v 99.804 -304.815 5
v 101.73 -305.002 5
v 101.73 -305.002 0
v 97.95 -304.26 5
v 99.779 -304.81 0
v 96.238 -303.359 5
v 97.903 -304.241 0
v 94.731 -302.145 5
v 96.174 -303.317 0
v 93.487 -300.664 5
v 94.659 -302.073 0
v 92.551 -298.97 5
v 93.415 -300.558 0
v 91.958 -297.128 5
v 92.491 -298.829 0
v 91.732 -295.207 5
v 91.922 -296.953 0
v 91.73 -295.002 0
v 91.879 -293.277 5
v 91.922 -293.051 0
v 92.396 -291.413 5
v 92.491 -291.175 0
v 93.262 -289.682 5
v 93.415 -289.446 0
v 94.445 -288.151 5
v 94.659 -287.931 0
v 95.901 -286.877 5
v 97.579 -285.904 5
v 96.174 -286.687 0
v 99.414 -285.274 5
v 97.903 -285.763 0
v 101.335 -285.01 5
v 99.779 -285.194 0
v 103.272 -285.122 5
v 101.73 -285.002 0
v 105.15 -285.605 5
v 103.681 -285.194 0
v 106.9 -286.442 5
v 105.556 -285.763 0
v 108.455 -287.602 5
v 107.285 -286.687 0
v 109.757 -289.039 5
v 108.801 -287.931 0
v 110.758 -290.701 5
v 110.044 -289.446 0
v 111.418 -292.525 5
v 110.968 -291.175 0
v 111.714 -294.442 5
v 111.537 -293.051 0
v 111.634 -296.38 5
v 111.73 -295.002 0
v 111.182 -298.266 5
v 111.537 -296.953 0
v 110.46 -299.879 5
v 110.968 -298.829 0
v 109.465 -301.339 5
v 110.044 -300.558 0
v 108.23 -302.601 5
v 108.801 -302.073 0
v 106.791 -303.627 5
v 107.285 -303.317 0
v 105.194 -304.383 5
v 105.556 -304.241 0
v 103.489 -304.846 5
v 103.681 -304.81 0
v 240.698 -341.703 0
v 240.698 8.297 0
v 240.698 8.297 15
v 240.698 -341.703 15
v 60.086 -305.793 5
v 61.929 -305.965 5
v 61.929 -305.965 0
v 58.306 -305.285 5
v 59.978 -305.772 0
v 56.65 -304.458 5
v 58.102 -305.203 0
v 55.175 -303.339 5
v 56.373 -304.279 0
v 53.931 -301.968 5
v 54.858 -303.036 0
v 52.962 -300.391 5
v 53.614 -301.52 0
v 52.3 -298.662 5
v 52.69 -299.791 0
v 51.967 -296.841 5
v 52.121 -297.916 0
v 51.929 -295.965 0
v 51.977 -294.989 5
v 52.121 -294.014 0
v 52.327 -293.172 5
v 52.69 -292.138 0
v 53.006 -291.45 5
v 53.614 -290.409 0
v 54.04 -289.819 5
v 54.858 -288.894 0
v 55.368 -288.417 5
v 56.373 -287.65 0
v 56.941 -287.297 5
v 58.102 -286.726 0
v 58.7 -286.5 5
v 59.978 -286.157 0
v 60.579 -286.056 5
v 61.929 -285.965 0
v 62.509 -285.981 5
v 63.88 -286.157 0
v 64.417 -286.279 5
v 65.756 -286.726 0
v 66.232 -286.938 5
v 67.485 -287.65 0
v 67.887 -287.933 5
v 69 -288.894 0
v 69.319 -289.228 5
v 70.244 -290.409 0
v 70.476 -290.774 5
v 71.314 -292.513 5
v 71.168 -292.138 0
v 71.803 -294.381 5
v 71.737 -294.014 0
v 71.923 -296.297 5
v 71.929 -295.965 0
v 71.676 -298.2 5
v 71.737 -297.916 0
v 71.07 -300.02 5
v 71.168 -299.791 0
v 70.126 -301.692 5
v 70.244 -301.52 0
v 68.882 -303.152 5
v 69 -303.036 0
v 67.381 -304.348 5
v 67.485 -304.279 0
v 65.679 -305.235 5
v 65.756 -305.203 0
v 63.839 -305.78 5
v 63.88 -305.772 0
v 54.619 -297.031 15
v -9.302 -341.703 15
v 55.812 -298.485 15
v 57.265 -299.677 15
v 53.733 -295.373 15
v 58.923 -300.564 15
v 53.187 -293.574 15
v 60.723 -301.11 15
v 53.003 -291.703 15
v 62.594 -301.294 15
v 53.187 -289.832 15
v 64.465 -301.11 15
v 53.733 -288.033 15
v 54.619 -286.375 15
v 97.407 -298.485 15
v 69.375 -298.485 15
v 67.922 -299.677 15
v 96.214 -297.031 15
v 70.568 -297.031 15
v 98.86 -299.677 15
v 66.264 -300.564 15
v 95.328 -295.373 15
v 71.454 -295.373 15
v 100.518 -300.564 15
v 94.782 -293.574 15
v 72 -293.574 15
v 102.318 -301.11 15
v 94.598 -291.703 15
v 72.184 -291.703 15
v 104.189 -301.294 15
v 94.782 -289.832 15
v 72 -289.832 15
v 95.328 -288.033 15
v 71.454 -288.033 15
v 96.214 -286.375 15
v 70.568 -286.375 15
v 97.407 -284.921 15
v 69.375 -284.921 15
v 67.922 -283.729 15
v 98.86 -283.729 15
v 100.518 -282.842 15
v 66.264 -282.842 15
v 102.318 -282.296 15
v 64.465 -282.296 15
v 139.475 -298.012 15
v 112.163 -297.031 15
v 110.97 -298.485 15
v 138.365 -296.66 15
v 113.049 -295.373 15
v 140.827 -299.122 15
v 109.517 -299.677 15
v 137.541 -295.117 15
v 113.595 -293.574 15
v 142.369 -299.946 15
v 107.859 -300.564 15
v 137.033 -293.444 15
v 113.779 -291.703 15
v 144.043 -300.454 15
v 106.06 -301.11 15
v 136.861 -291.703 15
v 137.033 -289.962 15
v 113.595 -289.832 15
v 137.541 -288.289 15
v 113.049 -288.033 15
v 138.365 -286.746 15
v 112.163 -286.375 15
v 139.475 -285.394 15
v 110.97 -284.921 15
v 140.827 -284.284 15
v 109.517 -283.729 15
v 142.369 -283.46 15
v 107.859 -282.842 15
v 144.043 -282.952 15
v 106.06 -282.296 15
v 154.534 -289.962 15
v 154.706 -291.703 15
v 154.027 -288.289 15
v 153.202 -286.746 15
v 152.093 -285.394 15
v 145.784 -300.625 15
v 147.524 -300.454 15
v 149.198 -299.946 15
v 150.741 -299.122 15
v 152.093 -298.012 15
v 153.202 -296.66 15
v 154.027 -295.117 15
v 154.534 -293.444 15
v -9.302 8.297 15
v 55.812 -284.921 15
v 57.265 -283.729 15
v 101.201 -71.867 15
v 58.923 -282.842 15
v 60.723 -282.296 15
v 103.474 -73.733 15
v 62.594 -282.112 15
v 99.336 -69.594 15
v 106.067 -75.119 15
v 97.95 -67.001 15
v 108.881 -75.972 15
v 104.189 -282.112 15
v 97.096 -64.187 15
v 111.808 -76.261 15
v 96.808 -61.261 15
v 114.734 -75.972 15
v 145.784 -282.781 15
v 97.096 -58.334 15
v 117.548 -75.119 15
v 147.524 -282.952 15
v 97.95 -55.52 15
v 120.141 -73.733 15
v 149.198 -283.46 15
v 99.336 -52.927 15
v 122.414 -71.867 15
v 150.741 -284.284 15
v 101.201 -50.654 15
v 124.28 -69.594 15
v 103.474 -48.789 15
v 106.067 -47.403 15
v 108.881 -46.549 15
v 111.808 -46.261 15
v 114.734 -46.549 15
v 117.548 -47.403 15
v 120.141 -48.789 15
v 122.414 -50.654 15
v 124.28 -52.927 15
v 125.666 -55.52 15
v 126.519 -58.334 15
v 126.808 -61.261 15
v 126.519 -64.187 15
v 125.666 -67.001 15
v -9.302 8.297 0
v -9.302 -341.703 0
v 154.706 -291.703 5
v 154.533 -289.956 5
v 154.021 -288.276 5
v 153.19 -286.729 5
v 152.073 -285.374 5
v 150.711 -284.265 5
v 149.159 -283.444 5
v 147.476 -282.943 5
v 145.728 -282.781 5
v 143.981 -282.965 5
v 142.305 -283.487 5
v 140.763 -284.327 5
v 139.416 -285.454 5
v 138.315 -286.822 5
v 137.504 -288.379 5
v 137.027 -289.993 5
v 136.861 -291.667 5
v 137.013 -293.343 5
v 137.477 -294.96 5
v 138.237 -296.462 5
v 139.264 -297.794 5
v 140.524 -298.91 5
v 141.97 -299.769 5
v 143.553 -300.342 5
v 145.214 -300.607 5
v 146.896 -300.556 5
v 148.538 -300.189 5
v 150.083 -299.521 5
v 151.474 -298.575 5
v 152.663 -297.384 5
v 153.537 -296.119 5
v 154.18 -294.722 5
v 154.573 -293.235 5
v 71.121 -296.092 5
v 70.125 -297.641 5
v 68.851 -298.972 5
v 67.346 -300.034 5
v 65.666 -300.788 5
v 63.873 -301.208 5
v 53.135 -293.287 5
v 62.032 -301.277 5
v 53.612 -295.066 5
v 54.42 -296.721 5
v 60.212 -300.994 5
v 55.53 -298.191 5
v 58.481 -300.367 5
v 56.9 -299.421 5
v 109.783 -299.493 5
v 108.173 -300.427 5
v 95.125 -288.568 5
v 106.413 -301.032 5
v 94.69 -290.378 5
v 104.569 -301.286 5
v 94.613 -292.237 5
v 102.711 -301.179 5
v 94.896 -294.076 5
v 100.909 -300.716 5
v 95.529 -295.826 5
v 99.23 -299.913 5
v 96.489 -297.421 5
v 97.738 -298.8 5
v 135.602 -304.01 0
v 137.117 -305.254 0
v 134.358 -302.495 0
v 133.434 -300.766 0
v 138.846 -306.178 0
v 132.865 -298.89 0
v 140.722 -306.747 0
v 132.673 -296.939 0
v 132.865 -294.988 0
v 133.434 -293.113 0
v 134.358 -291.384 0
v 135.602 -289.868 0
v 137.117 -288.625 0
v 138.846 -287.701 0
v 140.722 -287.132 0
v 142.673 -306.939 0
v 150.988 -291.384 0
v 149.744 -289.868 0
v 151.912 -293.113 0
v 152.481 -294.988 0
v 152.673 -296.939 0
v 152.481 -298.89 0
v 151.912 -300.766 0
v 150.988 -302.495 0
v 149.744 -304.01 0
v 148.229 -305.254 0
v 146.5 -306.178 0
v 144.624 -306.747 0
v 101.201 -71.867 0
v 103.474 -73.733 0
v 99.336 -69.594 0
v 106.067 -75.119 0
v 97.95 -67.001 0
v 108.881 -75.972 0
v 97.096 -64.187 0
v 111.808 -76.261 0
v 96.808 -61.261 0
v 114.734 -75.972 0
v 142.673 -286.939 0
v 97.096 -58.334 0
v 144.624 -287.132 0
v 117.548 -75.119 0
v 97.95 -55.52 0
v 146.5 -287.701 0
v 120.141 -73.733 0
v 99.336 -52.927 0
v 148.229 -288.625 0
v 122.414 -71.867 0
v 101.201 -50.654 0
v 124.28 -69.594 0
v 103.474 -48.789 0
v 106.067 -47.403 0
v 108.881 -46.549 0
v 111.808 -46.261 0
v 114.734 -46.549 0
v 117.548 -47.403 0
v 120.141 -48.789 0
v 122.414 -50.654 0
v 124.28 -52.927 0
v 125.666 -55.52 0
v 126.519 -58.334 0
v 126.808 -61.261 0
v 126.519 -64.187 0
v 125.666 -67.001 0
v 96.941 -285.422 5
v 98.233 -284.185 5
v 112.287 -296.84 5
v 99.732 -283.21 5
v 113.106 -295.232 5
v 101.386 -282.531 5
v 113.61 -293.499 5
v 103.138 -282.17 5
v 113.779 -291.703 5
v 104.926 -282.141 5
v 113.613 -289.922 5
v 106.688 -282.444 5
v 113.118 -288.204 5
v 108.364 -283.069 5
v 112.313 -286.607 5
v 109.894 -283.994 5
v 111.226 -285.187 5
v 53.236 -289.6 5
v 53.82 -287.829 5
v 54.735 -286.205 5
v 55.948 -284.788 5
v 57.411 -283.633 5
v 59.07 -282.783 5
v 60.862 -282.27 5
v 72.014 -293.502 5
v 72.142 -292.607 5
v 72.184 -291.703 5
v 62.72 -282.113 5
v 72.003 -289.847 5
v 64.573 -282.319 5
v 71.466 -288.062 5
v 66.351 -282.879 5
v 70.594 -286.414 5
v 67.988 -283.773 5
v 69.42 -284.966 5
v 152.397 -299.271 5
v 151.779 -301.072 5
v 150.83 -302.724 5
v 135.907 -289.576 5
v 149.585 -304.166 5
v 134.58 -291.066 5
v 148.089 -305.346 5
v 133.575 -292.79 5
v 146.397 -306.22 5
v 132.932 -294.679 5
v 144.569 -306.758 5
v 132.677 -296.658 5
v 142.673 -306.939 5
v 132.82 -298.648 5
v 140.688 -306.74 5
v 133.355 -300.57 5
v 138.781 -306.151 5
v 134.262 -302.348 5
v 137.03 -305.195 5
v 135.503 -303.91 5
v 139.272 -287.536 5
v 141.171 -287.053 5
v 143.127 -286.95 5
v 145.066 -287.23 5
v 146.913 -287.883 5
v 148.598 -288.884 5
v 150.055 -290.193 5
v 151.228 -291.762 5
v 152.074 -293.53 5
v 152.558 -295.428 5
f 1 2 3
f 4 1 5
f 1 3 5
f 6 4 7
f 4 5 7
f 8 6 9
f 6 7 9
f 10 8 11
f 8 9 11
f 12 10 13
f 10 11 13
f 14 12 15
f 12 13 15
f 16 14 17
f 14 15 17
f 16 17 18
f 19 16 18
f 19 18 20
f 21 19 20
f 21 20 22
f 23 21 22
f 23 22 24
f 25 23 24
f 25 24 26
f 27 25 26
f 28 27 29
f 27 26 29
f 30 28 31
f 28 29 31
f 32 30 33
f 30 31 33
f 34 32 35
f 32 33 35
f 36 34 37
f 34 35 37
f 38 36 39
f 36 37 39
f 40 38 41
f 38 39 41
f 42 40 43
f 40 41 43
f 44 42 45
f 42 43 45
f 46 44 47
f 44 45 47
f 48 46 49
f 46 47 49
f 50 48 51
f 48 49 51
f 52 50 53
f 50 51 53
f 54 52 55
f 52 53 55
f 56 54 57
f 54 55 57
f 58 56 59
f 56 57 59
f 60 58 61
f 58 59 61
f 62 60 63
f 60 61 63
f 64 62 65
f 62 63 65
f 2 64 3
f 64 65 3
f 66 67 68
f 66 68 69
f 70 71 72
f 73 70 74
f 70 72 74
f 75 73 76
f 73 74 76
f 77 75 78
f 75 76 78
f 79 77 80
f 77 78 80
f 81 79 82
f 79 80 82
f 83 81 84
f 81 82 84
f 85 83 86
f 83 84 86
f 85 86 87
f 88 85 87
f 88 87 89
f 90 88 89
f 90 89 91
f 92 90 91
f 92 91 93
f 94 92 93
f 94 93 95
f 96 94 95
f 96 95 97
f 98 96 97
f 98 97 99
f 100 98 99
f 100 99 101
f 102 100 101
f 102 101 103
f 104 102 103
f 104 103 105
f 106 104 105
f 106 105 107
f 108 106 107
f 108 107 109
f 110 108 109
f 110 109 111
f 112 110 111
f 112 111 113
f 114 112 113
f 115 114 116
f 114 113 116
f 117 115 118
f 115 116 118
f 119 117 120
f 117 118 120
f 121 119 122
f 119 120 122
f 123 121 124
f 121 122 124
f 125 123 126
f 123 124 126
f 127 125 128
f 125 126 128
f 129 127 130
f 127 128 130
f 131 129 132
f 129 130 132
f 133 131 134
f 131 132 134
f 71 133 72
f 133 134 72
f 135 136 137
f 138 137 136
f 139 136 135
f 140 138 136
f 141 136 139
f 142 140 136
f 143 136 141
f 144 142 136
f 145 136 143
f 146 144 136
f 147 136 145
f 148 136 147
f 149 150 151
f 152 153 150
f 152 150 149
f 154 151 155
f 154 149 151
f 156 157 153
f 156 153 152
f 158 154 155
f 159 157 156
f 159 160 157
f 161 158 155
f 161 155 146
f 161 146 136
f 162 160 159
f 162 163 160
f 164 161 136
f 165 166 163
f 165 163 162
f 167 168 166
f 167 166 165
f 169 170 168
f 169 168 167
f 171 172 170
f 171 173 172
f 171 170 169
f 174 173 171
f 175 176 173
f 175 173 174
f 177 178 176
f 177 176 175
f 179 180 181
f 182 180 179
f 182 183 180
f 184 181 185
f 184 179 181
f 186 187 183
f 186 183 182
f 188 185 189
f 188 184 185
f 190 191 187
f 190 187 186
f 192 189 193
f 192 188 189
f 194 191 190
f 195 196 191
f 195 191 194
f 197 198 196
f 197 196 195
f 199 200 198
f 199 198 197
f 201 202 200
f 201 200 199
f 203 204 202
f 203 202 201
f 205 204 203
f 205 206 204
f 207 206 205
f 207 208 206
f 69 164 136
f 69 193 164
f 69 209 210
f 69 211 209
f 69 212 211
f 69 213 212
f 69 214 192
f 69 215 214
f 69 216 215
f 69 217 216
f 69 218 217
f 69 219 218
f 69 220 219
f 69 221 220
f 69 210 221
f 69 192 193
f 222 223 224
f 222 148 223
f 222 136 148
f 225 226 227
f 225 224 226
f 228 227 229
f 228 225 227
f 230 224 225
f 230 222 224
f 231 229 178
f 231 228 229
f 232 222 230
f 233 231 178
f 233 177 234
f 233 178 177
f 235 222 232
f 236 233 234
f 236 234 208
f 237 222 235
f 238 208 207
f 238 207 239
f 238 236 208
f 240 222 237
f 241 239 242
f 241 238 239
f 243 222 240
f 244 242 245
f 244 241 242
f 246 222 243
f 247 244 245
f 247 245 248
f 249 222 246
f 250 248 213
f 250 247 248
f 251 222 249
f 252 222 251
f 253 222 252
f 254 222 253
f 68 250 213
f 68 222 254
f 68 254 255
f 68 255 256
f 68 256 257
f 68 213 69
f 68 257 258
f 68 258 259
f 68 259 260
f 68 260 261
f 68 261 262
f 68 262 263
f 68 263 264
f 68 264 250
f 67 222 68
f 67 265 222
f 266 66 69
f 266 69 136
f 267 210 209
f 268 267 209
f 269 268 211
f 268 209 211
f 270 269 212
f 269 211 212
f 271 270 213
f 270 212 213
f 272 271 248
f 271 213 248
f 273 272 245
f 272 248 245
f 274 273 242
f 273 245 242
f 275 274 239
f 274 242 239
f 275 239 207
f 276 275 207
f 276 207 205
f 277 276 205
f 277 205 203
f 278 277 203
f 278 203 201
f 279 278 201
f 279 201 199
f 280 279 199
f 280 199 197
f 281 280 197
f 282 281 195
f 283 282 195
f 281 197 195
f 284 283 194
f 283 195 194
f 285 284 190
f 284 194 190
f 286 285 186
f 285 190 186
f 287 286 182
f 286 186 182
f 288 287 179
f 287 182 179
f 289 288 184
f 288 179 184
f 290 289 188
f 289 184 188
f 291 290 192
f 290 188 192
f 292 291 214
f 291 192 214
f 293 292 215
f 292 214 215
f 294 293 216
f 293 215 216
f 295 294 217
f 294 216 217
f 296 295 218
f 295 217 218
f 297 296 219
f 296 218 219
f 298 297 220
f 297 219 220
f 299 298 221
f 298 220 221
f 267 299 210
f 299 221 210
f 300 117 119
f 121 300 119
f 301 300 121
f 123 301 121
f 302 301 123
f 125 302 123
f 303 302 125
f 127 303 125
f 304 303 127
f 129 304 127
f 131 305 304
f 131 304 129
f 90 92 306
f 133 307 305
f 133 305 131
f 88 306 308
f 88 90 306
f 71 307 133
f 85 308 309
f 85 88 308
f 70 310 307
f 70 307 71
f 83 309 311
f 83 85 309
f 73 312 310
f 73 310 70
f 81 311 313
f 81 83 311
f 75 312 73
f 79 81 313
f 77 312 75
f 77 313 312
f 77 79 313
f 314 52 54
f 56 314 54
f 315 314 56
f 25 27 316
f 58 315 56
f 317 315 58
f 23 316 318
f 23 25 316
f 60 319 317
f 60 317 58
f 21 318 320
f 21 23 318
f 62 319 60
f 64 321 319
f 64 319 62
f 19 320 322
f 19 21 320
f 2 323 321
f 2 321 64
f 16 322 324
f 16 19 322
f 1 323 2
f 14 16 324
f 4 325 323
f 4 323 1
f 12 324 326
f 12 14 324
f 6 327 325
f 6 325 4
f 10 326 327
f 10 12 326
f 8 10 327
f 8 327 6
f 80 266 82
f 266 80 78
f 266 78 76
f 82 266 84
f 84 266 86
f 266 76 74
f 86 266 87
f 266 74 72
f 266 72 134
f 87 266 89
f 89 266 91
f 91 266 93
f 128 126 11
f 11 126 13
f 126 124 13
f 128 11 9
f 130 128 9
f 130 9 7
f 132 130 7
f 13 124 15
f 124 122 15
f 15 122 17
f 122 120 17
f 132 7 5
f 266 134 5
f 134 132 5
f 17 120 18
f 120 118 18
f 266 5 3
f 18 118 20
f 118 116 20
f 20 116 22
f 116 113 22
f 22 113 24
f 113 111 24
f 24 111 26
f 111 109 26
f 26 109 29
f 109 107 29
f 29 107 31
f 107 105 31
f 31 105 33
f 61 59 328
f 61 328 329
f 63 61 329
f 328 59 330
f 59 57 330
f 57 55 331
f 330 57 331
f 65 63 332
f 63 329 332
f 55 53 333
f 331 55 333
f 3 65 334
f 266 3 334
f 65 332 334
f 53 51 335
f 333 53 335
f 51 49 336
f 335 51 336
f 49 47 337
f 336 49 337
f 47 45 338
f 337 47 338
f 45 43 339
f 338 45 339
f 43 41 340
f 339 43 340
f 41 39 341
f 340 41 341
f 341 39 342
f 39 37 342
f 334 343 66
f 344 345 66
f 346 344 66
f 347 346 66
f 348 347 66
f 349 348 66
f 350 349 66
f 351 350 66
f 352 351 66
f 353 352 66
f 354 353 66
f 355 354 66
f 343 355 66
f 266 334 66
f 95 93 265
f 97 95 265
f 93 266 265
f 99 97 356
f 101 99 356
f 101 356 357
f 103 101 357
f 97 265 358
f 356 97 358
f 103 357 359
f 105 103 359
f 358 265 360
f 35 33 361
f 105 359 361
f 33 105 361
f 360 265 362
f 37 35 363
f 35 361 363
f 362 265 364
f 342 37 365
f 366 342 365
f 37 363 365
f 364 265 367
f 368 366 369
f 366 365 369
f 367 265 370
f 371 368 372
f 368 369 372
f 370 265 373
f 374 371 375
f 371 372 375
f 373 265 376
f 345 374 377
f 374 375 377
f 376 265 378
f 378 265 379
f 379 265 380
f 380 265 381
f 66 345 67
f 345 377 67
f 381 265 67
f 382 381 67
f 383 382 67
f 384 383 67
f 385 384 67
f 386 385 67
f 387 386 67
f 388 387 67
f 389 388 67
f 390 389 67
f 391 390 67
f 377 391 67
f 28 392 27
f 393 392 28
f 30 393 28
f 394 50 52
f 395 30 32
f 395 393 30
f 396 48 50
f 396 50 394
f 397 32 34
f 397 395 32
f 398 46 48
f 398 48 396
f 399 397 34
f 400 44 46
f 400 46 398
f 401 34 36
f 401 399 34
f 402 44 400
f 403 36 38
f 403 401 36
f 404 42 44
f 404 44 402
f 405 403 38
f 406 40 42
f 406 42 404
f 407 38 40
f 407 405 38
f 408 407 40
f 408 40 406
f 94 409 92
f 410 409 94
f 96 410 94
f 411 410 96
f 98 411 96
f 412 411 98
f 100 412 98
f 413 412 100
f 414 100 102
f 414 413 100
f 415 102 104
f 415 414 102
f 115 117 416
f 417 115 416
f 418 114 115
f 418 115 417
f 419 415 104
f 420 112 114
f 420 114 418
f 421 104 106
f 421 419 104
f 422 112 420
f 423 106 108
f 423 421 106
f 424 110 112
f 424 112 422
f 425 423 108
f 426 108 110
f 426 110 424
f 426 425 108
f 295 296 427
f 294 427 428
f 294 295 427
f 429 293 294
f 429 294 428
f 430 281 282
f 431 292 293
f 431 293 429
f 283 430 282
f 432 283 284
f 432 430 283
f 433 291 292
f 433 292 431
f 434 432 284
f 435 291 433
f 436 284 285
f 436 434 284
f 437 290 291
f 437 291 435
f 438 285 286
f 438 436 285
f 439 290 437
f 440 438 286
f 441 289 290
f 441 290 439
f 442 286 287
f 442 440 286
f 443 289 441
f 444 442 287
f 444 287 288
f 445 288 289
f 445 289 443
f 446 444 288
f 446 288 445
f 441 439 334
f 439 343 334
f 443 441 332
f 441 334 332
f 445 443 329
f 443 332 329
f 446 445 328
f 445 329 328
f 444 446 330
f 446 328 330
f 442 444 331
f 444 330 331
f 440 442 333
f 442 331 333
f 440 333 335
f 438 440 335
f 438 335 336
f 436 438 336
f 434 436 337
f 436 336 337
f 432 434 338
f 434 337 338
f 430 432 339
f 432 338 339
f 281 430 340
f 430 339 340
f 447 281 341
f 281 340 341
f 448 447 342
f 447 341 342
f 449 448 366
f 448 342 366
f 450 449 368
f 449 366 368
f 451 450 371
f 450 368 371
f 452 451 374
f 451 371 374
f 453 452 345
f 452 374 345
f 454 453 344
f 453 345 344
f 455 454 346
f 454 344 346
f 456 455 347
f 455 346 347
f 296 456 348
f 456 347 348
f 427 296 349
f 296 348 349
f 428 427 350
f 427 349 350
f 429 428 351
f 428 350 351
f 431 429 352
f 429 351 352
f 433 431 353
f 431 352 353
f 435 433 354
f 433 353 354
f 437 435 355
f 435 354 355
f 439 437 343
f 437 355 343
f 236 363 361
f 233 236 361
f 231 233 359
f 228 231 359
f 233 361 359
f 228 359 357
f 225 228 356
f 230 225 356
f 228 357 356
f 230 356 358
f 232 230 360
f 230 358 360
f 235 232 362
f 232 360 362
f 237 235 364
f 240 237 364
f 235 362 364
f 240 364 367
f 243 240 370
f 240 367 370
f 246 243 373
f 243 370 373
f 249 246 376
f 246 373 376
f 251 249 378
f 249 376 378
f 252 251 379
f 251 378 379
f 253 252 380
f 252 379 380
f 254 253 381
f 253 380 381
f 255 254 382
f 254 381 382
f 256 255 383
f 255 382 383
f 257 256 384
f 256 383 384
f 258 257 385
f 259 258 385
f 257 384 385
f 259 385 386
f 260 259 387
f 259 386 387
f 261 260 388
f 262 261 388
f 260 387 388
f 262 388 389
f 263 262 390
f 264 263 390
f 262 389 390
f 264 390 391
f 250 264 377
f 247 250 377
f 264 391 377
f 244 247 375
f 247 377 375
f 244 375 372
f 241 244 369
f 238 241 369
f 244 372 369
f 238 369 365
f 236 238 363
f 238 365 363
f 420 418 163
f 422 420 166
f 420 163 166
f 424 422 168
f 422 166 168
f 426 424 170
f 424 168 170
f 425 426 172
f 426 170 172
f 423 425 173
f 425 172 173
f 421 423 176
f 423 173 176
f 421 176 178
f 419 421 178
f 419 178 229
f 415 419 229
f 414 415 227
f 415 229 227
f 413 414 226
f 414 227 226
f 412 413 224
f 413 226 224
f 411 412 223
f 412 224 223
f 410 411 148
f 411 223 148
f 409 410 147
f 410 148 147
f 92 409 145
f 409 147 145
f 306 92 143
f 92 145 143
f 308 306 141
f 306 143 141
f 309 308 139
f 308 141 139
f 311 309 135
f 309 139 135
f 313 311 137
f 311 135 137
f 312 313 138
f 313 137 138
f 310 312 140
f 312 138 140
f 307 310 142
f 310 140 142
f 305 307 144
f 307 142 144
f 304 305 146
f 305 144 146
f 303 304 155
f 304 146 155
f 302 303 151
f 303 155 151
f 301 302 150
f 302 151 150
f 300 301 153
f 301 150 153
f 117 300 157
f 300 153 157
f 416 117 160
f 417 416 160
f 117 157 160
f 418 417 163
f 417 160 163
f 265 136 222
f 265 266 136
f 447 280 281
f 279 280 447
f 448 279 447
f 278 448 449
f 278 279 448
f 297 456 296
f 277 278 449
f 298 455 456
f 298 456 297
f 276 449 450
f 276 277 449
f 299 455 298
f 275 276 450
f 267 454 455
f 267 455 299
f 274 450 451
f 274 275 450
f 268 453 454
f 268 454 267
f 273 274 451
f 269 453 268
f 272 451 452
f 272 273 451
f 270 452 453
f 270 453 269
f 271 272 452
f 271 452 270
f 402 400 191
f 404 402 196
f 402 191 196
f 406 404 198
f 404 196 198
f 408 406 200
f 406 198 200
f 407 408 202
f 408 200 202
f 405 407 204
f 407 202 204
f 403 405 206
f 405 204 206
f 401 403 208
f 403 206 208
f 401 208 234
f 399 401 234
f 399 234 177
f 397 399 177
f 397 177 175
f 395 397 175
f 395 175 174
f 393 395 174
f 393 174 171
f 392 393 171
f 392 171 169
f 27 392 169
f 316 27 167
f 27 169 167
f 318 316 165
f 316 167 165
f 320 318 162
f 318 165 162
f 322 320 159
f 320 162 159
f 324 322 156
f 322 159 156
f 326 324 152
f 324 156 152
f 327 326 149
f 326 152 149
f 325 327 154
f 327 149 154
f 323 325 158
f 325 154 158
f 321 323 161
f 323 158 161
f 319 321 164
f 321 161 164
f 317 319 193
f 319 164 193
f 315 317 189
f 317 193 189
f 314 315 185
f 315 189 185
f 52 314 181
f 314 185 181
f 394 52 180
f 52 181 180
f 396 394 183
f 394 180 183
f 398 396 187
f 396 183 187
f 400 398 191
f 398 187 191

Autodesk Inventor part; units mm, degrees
ref_plane "YZ Plane" through (0, 0, 0) normal (1, 0, 0) x (0, 1, 0)
ref_plane "XZ Plane" through (0, 0, 0) normal (0, 1, 0) x (-1, 0, 0)
ref_plane "XY Plane" through (0, 0, 0) normal (0, 0, 1) x (1, 0, 0)
sketch "Sketch1" plane through (0, 0, 0) normal (0, 0, 1) x (1, 0, 0)
  line L0 (-9.3024, 8.297) -> (240.6976, 8.297)
  line L1 (240.6976, 8.297) -> (240.6976, -341.703)
  line L2 (240.6976, -341.703) -> (-9.3024, -341.703)
  line L3 (-9.3024, -341.703) -> (-9.3024, 8.297)
  point P0 (0, 0)
  dimension "d0" = 250
  dimension "d1" = 350
extrude "Extrusion1" add sketch "Sketch1" along normal blind 15
sketch "Sketch2" plane through (0, 0, 15) normal (0, 0, 1) x (1, 0, 0)
  circle A0 centre (104.1886, -291.703) radius 9.5908
  circle A1 centre (62.5936, -291.703) radius 9.5908
  line L0 (240.6976, 8.297) -> (-9.3024, 8.297) projected
  line L1 (-9.3024, -341.703) -> (240.6976, -341.703) projected
  line L2 (240.6976, -341.703) -> (240.6976, 8.297) projected
  circle A2 centre (145.7836, -291.703) radius 8.9222
  line L3 (-9.3024, 8.297) -> (-9.3024, -341.703) projected
  point P0 (0, 0)
  point P1 (115.6976, -341.703)
extrude "Extrusion2" cut sketch "Sketch2" against normal blind 10 contours A0 | A1 | A2
sketch "Sketch3" plane through (62.5936, -291.703, 5) normal (0, 0, 1) x (1, 0, 0)
  point P0 (-62.5936, 291.703)
  point P1 (-0.6647, -4.2616)
hole "Hole1" at (61.9289, -295.9646, 5) direction (0, 0, -1) diameter 20 end through all
sketch "Sketch4" plane through (104.1886, -291.703, 5) normal (0, 0, 1) x (1, 0, 0)
  point P0 (-104.1886, 291.703)
  point P1 (-2.459, -3.2991)
hole "Hole2" at (101.7296, -295.0021, 5) direction (0, 0, -1) diameter 20 end through all
sketch "Sketch5" plane through (145.7836, -291.703, 5) normal (0, 0, 1) x (1, 0, 0)
  point P0 (-145.7836, 291.703)
  point P1 (-3.1106, -5.2364)
hole "Hole3" at (142.673, -296.9394, 5) direction (0, 0, -1) diameter 20 end through all
sketch "Sketch6" plane through (0, 0, 15) normal (0, 0, 1) x (1, 0, 0)
  circle A0 centre (111.8077, -61.2607) radius 10
  point P0 (0, 0)
  dimension "d41" = 20
hole "Hole4" at (111.8077, -61.2607, 15) direction (0, 0, -1) diameter 20 end through all
sketch "Sketch7" plane through (0, 0, 15) normal (0, 0, 1) x (1, 0, 0)
  circle A0 centre (111.8077, -61.2607) radius 10 projected
  circle A1 centre (111.8077, -61.2607) radius 15
  point P0 (0, 0)
  dimension "d49" = 30
hole "Hole5" at (111.8077, -61.2607, 15) direction (0, 0, -1) diameter 30 end through all
properties part number "main base new edited new" material "PVC, Unplasticized"
